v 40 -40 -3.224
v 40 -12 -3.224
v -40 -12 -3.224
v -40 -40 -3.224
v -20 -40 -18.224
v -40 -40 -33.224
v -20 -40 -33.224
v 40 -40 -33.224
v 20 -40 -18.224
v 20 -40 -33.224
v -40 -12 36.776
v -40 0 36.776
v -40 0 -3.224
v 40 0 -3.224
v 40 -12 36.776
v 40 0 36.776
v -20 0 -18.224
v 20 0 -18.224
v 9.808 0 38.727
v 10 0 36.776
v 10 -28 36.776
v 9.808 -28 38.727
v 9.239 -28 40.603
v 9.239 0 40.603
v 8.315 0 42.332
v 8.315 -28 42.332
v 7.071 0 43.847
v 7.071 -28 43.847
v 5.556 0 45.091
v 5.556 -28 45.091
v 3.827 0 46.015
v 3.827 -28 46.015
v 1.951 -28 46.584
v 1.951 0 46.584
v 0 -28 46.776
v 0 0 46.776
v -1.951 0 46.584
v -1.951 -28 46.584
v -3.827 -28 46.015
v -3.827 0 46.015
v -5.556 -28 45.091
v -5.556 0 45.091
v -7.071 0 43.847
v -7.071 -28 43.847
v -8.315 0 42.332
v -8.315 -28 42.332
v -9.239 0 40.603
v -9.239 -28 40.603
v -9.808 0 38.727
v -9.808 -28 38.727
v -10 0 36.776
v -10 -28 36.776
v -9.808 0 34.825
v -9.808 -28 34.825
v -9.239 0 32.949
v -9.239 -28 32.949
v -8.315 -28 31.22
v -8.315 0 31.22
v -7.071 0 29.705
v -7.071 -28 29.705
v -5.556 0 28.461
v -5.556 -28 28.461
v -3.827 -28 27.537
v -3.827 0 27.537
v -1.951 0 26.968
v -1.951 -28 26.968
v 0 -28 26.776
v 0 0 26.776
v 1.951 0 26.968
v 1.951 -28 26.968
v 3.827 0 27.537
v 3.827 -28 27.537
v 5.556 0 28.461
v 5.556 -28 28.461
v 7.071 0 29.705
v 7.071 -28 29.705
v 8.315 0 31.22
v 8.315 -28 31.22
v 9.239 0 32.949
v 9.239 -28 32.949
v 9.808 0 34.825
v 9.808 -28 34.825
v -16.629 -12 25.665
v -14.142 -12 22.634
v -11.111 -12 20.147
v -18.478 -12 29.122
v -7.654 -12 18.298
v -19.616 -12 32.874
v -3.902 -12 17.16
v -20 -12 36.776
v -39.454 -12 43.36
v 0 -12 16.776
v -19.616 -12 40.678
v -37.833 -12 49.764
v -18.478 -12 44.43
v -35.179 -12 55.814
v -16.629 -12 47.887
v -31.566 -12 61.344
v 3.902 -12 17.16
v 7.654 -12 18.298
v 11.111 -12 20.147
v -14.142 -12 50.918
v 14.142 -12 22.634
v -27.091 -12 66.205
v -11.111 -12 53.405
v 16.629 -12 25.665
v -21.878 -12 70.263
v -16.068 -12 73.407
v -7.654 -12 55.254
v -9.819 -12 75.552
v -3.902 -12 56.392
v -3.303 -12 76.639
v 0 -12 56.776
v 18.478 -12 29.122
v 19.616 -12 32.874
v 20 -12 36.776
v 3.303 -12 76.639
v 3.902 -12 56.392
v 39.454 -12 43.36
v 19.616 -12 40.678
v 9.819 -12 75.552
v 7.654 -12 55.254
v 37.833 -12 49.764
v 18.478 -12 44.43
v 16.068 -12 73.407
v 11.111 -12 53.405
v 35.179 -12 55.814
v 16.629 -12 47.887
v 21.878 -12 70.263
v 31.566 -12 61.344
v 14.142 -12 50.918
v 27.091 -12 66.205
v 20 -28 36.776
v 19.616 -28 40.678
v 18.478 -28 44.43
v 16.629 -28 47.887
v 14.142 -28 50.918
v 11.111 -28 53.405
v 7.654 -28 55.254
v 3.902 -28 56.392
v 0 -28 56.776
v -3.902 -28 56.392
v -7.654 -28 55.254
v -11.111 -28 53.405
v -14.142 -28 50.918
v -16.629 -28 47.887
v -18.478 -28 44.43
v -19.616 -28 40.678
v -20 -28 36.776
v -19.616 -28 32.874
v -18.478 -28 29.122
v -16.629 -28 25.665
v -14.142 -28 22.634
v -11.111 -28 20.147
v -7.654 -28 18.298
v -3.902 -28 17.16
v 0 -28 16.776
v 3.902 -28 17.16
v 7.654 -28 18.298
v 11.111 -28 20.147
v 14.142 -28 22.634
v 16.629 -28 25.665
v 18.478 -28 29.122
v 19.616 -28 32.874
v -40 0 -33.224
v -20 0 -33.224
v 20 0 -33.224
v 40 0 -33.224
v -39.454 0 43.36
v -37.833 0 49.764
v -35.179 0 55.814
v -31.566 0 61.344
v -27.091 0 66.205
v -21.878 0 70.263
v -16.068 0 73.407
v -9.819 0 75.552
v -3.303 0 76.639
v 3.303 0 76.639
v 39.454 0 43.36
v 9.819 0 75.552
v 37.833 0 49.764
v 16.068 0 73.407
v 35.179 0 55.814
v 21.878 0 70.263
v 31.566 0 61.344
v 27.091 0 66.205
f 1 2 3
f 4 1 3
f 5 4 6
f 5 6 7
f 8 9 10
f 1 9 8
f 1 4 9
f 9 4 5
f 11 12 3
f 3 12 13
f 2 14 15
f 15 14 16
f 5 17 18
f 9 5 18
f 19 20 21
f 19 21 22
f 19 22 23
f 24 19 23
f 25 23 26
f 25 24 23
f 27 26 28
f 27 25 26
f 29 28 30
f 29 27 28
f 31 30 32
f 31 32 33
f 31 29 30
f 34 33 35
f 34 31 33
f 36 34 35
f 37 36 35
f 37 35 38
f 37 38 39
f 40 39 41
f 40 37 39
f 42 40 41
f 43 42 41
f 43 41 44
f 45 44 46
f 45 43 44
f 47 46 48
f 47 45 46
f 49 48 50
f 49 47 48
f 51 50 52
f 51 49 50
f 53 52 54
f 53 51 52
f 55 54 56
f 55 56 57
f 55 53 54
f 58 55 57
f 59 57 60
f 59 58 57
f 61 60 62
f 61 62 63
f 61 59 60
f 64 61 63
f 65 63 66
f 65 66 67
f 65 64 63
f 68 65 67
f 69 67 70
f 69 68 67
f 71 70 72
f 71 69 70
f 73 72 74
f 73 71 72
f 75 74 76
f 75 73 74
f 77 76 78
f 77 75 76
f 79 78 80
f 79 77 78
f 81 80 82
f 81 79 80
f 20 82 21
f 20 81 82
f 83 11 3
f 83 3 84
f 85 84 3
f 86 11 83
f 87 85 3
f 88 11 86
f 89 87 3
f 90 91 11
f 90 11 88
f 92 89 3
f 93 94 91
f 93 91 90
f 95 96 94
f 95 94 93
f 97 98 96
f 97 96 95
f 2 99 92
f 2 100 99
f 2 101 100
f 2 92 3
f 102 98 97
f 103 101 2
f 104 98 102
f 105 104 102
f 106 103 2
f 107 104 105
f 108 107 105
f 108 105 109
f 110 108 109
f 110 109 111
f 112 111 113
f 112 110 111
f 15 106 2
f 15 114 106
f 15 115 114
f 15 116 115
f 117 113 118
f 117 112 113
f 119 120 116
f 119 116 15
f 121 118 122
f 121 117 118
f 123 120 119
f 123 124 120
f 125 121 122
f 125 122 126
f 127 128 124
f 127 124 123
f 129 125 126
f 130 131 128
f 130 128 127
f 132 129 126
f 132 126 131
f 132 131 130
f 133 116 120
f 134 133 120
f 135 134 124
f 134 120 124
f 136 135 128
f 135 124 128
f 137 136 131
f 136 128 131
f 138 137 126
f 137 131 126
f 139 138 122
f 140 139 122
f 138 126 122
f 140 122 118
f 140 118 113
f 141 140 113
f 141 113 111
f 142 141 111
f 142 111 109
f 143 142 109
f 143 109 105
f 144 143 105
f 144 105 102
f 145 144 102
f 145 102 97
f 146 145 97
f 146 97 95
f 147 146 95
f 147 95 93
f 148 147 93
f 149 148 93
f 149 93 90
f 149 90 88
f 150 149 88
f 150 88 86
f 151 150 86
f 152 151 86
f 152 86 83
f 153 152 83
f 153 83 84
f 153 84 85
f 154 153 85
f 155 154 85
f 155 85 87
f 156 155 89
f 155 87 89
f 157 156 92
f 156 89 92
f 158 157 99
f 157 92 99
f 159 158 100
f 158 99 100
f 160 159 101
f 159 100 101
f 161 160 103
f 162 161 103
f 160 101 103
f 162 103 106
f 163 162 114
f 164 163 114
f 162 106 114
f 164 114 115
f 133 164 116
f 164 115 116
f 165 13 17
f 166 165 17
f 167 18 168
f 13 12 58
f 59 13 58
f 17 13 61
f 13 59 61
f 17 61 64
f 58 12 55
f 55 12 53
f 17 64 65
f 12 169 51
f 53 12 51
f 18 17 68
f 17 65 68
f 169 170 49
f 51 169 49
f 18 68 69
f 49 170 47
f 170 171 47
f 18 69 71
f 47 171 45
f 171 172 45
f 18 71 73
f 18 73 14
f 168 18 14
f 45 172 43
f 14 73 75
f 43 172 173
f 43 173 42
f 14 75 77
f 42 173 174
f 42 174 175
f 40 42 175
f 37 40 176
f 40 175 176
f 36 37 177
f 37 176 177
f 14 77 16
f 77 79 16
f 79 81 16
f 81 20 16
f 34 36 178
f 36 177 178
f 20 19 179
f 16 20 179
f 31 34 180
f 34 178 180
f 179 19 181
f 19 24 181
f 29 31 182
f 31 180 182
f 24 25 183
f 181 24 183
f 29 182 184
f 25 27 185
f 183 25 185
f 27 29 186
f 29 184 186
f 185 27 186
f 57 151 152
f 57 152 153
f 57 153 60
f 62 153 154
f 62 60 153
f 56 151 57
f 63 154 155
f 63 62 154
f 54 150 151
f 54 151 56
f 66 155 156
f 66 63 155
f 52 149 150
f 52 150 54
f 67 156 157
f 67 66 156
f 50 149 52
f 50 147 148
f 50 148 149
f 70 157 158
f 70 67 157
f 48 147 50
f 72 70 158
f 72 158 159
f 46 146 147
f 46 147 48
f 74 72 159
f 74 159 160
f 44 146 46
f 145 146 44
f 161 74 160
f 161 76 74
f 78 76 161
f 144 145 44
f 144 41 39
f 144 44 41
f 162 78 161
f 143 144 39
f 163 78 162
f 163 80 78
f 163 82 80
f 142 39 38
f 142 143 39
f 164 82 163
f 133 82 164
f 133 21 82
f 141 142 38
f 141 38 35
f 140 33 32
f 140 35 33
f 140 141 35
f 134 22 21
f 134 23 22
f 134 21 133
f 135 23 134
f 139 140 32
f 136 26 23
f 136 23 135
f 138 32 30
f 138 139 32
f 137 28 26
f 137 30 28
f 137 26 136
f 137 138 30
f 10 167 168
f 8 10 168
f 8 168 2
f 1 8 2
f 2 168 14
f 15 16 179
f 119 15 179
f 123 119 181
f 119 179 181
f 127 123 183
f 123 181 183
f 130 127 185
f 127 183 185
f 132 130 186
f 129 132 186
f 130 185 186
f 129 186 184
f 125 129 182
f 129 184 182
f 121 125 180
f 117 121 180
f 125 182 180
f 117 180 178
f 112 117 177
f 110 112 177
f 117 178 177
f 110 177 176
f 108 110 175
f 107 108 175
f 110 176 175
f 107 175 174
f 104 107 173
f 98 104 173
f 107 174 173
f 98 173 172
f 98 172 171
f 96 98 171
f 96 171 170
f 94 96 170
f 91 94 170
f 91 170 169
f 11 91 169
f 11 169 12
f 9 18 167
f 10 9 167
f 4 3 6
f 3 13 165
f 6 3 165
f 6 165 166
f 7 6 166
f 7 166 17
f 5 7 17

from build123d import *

# Parameters (mm, degrees)
F0_R     = 20
F0_R_2   = 10
F1_DEPTH = 28
F2_DEPTH = 12
F3_DEPTH = 40


# Not quite as in the source:
# - ends of sketch curves that miss each other by under 0.0002 mm in the source are joined


with BuildPart() as f1:
    # F0 (on Front) → F1 (new body)
    with BuildSketch(Plane.XZ):
        with Locations((0, 36.7759418548)):
            Circle(F0_R)
        with Locations((0, 36.7759418548)):
            Circle(F0_R_2, mode=Mode.SUBTRACT)
    extrude(amount=F1_DEPTH)

    # F0 (on Front) → F2 (join)
    with BuildSketch(Plane.XZ):
        with BuildLine():
            ThreePointArc((40, 36.7759418548), (0, 76.7759418548), (-40, 36.7759418548))
            Line((-40, 36.7759418548), (-40.0000252162, -3.2240581452))
            Line((-40.0000252162, -3.2240581452), (39.9999747838, -3.2240581452))
            Line((39.9999747838, -3.2240581452), (40, 36.7759418548))
        make_face()
        with Locations((0, 36.7759418548)):
            Circle(F0_R, mode=Mode.SUBTRACT)
    extrude(amount=F2_DEPTH)

    # F0 (on Front) → F3 (join)
    with BuildSketch(Plane.XZ):
        Polygon((39.9999747838, -3.2240581452), (-40, -3.2240581452), (-40.0000441283, -33.2240581452), (-20.0000441283, -33.2240707533), (-20.0000346722, -18.2240707533), (19.9999653278, -18.2240623479), (19.9999558717, -33.2240623479), (39.9999558717, -33.2240581452), align=None)
    extrude(amount=F3_DEPTH)


solid = f1.part
